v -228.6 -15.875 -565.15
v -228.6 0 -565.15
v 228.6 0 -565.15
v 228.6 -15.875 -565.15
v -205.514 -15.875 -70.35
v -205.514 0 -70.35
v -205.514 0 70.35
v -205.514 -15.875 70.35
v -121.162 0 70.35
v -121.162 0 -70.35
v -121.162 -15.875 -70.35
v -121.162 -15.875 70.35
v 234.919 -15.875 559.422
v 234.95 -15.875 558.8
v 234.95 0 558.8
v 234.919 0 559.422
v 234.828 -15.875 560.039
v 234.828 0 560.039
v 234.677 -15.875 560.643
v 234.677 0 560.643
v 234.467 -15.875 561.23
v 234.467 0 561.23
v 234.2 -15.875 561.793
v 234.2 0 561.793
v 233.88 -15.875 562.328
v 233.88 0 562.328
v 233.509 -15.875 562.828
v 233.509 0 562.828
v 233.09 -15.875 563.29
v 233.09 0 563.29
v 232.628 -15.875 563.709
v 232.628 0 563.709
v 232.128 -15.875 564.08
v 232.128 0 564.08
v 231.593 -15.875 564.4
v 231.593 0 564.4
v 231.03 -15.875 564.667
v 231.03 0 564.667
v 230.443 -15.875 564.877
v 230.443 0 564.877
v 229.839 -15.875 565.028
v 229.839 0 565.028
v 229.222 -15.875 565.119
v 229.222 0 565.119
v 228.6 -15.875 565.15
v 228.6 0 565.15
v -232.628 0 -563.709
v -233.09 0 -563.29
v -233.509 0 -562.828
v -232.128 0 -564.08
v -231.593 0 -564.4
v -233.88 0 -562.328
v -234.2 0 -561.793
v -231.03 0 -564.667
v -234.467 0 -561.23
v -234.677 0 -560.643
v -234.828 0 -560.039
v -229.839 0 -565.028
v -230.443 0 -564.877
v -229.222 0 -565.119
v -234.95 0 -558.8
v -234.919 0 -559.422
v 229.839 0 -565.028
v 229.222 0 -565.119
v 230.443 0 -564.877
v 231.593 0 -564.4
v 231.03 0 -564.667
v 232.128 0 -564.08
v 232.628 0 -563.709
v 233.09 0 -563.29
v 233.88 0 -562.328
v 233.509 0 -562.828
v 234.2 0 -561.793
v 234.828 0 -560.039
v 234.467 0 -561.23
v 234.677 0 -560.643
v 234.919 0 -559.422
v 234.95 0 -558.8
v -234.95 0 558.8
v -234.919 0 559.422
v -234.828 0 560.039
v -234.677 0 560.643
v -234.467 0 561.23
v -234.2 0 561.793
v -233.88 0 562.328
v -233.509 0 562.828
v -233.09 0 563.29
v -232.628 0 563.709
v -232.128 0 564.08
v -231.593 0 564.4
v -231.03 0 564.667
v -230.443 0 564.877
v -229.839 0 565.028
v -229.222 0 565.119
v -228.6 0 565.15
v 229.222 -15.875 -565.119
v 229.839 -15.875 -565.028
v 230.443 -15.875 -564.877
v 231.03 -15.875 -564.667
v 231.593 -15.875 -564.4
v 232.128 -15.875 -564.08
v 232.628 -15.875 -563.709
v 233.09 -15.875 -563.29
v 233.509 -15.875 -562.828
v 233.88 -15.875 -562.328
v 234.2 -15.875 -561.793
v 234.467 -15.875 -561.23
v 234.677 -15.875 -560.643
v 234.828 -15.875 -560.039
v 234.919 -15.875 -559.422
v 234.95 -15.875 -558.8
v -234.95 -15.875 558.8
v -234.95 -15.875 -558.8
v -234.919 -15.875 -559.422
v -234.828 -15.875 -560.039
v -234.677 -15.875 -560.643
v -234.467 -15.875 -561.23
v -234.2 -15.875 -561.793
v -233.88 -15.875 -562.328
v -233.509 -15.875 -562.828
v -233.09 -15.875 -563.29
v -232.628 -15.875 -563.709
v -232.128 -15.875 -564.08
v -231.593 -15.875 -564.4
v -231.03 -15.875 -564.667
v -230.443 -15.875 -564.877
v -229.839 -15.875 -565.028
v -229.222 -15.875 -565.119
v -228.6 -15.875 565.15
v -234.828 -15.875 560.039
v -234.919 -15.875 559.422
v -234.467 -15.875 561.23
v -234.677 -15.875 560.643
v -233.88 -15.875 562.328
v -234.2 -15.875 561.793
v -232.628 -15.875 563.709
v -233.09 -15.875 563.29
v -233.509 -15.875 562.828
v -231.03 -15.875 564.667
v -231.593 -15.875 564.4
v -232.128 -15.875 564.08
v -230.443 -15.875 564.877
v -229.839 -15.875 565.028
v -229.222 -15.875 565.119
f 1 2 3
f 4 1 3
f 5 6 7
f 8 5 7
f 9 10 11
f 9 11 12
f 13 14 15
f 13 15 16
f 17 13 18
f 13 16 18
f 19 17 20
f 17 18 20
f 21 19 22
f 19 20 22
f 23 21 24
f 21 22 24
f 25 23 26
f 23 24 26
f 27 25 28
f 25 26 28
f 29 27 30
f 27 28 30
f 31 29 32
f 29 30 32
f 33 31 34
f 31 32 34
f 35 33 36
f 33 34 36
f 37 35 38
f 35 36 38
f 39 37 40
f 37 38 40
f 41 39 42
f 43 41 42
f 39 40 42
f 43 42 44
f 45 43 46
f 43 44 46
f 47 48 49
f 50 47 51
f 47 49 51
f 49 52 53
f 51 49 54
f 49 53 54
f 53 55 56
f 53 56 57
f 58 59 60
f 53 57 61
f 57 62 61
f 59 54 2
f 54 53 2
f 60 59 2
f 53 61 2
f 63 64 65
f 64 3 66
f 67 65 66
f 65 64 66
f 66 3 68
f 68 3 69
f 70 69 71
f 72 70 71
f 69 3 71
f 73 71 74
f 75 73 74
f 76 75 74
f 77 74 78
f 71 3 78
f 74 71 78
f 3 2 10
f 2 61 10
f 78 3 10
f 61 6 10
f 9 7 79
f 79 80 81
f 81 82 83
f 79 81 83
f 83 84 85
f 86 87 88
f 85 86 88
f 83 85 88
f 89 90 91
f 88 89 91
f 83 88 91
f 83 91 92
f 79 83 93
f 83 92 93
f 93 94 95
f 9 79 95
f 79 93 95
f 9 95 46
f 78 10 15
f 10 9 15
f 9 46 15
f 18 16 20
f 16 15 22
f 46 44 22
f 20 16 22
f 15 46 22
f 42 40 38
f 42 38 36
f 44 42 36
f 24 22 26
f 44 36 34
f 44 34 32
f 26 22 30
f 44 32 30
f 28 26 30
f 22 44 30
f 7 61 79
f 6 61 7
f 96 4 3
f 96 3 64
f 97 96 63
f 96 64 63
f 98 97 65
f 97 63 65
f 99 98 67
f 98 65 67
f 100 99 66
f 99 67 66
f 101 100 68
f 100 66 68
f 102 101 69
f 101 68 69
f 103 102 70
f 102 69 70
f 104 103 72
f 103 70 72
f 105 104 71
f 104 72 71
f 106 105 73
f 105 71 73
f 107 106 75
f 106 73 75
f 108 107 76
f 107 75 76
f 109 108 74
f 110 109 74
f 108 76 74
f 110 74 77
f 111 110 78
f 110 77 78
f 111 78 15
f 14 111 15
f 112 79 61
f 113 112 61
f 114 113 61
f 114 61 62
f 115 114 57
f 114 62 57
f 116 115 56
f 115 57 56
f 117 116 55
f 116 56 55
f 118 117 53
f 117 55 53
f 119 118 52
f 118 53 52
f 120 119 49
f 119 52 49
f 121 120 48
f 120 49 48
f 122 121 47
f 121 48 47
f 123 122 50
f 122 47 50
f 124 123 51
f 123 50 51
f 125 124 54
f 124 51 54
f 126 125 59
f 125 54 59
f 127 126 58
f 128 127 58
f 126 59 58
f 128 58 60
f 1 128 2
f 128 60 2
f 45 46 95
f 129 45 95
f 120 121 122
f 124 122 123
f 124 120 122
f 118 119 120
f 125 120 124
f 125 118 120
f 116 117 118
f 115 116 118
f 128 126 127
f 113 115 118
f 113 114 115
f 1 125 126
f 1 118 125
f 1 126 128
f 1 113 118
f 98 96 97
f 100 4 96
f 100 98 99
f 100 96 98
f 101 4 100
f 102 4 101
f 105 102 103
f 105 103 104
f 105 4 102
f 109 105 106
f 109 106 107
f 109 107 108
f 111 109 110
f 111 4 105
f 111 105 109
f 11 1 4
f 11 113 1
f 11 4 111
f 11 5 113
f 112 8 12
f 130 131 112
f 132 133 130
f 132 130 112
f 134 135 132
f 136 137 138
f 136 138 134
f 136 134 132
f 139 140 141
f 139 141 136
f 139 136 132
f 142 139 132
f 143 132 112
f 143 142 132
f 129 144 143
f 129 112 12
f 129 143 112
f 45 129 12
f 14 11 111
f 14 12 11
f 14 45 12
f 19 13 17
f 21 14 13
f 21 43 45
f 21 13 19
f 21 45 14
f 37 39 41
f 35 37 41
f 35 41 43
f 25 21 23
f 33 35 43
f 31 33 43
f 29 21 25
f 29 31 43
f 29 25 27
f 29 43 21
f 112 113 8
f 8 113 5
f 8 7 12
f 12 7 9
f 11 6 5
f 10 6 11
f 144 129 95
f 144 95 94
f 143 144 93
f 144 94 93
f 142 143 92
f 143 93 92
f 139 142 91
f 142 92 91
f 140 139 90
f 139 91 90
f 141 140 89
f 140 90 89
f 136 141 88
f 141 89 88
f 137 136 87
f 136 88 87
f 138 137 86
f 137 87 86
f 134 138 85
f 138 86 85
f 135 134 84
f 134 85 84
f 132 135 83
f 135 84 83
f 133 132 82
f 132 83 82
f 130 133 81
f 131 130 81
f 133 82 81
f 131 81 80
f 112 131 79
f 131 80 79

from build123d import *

# Parameters (mm, degrees)
F0_W     = 84.352017
F0_H     = 140.700102
F1_DEPTH = 15.875


with BuildPart() as f1:
    # F0 (on Front) → F1 (new body)
    with BuildSketch(Plane.XZ):
        with BuildLine():
            Line((-228.6, -565.15), (228.6, -565.15))
            ThreePointArc((228.6, -565.15), (233.090128, -563.290128), (234.95, -558.8))
            Line((234.95, -558.8), (234.95, 558.8))
            ThreePointArc((234.95, 558.8), (233.090128, 563.290128), (228.6, 565.15))
            Line((228.6, 565.15), (-228.6, 565.15))
            ThreePointArc((-228.6, 565.15), (-233.090128, 563.290128), (-234.95, 558.8))
            Line((-234.95, 558.8), (-234.95, -558.8))
            ThreePointArc((-234.95, -558.8), (-233.090128, -563.290128), (-228.6, -565.15))
        make_face()
        with Locations((-163.338482, 0)):
            Rectangle(F0_W, F0_H, mode=Mode.SUBTRACT)
    extrude(amount=F1_DEPTH)


solid = f1.part
